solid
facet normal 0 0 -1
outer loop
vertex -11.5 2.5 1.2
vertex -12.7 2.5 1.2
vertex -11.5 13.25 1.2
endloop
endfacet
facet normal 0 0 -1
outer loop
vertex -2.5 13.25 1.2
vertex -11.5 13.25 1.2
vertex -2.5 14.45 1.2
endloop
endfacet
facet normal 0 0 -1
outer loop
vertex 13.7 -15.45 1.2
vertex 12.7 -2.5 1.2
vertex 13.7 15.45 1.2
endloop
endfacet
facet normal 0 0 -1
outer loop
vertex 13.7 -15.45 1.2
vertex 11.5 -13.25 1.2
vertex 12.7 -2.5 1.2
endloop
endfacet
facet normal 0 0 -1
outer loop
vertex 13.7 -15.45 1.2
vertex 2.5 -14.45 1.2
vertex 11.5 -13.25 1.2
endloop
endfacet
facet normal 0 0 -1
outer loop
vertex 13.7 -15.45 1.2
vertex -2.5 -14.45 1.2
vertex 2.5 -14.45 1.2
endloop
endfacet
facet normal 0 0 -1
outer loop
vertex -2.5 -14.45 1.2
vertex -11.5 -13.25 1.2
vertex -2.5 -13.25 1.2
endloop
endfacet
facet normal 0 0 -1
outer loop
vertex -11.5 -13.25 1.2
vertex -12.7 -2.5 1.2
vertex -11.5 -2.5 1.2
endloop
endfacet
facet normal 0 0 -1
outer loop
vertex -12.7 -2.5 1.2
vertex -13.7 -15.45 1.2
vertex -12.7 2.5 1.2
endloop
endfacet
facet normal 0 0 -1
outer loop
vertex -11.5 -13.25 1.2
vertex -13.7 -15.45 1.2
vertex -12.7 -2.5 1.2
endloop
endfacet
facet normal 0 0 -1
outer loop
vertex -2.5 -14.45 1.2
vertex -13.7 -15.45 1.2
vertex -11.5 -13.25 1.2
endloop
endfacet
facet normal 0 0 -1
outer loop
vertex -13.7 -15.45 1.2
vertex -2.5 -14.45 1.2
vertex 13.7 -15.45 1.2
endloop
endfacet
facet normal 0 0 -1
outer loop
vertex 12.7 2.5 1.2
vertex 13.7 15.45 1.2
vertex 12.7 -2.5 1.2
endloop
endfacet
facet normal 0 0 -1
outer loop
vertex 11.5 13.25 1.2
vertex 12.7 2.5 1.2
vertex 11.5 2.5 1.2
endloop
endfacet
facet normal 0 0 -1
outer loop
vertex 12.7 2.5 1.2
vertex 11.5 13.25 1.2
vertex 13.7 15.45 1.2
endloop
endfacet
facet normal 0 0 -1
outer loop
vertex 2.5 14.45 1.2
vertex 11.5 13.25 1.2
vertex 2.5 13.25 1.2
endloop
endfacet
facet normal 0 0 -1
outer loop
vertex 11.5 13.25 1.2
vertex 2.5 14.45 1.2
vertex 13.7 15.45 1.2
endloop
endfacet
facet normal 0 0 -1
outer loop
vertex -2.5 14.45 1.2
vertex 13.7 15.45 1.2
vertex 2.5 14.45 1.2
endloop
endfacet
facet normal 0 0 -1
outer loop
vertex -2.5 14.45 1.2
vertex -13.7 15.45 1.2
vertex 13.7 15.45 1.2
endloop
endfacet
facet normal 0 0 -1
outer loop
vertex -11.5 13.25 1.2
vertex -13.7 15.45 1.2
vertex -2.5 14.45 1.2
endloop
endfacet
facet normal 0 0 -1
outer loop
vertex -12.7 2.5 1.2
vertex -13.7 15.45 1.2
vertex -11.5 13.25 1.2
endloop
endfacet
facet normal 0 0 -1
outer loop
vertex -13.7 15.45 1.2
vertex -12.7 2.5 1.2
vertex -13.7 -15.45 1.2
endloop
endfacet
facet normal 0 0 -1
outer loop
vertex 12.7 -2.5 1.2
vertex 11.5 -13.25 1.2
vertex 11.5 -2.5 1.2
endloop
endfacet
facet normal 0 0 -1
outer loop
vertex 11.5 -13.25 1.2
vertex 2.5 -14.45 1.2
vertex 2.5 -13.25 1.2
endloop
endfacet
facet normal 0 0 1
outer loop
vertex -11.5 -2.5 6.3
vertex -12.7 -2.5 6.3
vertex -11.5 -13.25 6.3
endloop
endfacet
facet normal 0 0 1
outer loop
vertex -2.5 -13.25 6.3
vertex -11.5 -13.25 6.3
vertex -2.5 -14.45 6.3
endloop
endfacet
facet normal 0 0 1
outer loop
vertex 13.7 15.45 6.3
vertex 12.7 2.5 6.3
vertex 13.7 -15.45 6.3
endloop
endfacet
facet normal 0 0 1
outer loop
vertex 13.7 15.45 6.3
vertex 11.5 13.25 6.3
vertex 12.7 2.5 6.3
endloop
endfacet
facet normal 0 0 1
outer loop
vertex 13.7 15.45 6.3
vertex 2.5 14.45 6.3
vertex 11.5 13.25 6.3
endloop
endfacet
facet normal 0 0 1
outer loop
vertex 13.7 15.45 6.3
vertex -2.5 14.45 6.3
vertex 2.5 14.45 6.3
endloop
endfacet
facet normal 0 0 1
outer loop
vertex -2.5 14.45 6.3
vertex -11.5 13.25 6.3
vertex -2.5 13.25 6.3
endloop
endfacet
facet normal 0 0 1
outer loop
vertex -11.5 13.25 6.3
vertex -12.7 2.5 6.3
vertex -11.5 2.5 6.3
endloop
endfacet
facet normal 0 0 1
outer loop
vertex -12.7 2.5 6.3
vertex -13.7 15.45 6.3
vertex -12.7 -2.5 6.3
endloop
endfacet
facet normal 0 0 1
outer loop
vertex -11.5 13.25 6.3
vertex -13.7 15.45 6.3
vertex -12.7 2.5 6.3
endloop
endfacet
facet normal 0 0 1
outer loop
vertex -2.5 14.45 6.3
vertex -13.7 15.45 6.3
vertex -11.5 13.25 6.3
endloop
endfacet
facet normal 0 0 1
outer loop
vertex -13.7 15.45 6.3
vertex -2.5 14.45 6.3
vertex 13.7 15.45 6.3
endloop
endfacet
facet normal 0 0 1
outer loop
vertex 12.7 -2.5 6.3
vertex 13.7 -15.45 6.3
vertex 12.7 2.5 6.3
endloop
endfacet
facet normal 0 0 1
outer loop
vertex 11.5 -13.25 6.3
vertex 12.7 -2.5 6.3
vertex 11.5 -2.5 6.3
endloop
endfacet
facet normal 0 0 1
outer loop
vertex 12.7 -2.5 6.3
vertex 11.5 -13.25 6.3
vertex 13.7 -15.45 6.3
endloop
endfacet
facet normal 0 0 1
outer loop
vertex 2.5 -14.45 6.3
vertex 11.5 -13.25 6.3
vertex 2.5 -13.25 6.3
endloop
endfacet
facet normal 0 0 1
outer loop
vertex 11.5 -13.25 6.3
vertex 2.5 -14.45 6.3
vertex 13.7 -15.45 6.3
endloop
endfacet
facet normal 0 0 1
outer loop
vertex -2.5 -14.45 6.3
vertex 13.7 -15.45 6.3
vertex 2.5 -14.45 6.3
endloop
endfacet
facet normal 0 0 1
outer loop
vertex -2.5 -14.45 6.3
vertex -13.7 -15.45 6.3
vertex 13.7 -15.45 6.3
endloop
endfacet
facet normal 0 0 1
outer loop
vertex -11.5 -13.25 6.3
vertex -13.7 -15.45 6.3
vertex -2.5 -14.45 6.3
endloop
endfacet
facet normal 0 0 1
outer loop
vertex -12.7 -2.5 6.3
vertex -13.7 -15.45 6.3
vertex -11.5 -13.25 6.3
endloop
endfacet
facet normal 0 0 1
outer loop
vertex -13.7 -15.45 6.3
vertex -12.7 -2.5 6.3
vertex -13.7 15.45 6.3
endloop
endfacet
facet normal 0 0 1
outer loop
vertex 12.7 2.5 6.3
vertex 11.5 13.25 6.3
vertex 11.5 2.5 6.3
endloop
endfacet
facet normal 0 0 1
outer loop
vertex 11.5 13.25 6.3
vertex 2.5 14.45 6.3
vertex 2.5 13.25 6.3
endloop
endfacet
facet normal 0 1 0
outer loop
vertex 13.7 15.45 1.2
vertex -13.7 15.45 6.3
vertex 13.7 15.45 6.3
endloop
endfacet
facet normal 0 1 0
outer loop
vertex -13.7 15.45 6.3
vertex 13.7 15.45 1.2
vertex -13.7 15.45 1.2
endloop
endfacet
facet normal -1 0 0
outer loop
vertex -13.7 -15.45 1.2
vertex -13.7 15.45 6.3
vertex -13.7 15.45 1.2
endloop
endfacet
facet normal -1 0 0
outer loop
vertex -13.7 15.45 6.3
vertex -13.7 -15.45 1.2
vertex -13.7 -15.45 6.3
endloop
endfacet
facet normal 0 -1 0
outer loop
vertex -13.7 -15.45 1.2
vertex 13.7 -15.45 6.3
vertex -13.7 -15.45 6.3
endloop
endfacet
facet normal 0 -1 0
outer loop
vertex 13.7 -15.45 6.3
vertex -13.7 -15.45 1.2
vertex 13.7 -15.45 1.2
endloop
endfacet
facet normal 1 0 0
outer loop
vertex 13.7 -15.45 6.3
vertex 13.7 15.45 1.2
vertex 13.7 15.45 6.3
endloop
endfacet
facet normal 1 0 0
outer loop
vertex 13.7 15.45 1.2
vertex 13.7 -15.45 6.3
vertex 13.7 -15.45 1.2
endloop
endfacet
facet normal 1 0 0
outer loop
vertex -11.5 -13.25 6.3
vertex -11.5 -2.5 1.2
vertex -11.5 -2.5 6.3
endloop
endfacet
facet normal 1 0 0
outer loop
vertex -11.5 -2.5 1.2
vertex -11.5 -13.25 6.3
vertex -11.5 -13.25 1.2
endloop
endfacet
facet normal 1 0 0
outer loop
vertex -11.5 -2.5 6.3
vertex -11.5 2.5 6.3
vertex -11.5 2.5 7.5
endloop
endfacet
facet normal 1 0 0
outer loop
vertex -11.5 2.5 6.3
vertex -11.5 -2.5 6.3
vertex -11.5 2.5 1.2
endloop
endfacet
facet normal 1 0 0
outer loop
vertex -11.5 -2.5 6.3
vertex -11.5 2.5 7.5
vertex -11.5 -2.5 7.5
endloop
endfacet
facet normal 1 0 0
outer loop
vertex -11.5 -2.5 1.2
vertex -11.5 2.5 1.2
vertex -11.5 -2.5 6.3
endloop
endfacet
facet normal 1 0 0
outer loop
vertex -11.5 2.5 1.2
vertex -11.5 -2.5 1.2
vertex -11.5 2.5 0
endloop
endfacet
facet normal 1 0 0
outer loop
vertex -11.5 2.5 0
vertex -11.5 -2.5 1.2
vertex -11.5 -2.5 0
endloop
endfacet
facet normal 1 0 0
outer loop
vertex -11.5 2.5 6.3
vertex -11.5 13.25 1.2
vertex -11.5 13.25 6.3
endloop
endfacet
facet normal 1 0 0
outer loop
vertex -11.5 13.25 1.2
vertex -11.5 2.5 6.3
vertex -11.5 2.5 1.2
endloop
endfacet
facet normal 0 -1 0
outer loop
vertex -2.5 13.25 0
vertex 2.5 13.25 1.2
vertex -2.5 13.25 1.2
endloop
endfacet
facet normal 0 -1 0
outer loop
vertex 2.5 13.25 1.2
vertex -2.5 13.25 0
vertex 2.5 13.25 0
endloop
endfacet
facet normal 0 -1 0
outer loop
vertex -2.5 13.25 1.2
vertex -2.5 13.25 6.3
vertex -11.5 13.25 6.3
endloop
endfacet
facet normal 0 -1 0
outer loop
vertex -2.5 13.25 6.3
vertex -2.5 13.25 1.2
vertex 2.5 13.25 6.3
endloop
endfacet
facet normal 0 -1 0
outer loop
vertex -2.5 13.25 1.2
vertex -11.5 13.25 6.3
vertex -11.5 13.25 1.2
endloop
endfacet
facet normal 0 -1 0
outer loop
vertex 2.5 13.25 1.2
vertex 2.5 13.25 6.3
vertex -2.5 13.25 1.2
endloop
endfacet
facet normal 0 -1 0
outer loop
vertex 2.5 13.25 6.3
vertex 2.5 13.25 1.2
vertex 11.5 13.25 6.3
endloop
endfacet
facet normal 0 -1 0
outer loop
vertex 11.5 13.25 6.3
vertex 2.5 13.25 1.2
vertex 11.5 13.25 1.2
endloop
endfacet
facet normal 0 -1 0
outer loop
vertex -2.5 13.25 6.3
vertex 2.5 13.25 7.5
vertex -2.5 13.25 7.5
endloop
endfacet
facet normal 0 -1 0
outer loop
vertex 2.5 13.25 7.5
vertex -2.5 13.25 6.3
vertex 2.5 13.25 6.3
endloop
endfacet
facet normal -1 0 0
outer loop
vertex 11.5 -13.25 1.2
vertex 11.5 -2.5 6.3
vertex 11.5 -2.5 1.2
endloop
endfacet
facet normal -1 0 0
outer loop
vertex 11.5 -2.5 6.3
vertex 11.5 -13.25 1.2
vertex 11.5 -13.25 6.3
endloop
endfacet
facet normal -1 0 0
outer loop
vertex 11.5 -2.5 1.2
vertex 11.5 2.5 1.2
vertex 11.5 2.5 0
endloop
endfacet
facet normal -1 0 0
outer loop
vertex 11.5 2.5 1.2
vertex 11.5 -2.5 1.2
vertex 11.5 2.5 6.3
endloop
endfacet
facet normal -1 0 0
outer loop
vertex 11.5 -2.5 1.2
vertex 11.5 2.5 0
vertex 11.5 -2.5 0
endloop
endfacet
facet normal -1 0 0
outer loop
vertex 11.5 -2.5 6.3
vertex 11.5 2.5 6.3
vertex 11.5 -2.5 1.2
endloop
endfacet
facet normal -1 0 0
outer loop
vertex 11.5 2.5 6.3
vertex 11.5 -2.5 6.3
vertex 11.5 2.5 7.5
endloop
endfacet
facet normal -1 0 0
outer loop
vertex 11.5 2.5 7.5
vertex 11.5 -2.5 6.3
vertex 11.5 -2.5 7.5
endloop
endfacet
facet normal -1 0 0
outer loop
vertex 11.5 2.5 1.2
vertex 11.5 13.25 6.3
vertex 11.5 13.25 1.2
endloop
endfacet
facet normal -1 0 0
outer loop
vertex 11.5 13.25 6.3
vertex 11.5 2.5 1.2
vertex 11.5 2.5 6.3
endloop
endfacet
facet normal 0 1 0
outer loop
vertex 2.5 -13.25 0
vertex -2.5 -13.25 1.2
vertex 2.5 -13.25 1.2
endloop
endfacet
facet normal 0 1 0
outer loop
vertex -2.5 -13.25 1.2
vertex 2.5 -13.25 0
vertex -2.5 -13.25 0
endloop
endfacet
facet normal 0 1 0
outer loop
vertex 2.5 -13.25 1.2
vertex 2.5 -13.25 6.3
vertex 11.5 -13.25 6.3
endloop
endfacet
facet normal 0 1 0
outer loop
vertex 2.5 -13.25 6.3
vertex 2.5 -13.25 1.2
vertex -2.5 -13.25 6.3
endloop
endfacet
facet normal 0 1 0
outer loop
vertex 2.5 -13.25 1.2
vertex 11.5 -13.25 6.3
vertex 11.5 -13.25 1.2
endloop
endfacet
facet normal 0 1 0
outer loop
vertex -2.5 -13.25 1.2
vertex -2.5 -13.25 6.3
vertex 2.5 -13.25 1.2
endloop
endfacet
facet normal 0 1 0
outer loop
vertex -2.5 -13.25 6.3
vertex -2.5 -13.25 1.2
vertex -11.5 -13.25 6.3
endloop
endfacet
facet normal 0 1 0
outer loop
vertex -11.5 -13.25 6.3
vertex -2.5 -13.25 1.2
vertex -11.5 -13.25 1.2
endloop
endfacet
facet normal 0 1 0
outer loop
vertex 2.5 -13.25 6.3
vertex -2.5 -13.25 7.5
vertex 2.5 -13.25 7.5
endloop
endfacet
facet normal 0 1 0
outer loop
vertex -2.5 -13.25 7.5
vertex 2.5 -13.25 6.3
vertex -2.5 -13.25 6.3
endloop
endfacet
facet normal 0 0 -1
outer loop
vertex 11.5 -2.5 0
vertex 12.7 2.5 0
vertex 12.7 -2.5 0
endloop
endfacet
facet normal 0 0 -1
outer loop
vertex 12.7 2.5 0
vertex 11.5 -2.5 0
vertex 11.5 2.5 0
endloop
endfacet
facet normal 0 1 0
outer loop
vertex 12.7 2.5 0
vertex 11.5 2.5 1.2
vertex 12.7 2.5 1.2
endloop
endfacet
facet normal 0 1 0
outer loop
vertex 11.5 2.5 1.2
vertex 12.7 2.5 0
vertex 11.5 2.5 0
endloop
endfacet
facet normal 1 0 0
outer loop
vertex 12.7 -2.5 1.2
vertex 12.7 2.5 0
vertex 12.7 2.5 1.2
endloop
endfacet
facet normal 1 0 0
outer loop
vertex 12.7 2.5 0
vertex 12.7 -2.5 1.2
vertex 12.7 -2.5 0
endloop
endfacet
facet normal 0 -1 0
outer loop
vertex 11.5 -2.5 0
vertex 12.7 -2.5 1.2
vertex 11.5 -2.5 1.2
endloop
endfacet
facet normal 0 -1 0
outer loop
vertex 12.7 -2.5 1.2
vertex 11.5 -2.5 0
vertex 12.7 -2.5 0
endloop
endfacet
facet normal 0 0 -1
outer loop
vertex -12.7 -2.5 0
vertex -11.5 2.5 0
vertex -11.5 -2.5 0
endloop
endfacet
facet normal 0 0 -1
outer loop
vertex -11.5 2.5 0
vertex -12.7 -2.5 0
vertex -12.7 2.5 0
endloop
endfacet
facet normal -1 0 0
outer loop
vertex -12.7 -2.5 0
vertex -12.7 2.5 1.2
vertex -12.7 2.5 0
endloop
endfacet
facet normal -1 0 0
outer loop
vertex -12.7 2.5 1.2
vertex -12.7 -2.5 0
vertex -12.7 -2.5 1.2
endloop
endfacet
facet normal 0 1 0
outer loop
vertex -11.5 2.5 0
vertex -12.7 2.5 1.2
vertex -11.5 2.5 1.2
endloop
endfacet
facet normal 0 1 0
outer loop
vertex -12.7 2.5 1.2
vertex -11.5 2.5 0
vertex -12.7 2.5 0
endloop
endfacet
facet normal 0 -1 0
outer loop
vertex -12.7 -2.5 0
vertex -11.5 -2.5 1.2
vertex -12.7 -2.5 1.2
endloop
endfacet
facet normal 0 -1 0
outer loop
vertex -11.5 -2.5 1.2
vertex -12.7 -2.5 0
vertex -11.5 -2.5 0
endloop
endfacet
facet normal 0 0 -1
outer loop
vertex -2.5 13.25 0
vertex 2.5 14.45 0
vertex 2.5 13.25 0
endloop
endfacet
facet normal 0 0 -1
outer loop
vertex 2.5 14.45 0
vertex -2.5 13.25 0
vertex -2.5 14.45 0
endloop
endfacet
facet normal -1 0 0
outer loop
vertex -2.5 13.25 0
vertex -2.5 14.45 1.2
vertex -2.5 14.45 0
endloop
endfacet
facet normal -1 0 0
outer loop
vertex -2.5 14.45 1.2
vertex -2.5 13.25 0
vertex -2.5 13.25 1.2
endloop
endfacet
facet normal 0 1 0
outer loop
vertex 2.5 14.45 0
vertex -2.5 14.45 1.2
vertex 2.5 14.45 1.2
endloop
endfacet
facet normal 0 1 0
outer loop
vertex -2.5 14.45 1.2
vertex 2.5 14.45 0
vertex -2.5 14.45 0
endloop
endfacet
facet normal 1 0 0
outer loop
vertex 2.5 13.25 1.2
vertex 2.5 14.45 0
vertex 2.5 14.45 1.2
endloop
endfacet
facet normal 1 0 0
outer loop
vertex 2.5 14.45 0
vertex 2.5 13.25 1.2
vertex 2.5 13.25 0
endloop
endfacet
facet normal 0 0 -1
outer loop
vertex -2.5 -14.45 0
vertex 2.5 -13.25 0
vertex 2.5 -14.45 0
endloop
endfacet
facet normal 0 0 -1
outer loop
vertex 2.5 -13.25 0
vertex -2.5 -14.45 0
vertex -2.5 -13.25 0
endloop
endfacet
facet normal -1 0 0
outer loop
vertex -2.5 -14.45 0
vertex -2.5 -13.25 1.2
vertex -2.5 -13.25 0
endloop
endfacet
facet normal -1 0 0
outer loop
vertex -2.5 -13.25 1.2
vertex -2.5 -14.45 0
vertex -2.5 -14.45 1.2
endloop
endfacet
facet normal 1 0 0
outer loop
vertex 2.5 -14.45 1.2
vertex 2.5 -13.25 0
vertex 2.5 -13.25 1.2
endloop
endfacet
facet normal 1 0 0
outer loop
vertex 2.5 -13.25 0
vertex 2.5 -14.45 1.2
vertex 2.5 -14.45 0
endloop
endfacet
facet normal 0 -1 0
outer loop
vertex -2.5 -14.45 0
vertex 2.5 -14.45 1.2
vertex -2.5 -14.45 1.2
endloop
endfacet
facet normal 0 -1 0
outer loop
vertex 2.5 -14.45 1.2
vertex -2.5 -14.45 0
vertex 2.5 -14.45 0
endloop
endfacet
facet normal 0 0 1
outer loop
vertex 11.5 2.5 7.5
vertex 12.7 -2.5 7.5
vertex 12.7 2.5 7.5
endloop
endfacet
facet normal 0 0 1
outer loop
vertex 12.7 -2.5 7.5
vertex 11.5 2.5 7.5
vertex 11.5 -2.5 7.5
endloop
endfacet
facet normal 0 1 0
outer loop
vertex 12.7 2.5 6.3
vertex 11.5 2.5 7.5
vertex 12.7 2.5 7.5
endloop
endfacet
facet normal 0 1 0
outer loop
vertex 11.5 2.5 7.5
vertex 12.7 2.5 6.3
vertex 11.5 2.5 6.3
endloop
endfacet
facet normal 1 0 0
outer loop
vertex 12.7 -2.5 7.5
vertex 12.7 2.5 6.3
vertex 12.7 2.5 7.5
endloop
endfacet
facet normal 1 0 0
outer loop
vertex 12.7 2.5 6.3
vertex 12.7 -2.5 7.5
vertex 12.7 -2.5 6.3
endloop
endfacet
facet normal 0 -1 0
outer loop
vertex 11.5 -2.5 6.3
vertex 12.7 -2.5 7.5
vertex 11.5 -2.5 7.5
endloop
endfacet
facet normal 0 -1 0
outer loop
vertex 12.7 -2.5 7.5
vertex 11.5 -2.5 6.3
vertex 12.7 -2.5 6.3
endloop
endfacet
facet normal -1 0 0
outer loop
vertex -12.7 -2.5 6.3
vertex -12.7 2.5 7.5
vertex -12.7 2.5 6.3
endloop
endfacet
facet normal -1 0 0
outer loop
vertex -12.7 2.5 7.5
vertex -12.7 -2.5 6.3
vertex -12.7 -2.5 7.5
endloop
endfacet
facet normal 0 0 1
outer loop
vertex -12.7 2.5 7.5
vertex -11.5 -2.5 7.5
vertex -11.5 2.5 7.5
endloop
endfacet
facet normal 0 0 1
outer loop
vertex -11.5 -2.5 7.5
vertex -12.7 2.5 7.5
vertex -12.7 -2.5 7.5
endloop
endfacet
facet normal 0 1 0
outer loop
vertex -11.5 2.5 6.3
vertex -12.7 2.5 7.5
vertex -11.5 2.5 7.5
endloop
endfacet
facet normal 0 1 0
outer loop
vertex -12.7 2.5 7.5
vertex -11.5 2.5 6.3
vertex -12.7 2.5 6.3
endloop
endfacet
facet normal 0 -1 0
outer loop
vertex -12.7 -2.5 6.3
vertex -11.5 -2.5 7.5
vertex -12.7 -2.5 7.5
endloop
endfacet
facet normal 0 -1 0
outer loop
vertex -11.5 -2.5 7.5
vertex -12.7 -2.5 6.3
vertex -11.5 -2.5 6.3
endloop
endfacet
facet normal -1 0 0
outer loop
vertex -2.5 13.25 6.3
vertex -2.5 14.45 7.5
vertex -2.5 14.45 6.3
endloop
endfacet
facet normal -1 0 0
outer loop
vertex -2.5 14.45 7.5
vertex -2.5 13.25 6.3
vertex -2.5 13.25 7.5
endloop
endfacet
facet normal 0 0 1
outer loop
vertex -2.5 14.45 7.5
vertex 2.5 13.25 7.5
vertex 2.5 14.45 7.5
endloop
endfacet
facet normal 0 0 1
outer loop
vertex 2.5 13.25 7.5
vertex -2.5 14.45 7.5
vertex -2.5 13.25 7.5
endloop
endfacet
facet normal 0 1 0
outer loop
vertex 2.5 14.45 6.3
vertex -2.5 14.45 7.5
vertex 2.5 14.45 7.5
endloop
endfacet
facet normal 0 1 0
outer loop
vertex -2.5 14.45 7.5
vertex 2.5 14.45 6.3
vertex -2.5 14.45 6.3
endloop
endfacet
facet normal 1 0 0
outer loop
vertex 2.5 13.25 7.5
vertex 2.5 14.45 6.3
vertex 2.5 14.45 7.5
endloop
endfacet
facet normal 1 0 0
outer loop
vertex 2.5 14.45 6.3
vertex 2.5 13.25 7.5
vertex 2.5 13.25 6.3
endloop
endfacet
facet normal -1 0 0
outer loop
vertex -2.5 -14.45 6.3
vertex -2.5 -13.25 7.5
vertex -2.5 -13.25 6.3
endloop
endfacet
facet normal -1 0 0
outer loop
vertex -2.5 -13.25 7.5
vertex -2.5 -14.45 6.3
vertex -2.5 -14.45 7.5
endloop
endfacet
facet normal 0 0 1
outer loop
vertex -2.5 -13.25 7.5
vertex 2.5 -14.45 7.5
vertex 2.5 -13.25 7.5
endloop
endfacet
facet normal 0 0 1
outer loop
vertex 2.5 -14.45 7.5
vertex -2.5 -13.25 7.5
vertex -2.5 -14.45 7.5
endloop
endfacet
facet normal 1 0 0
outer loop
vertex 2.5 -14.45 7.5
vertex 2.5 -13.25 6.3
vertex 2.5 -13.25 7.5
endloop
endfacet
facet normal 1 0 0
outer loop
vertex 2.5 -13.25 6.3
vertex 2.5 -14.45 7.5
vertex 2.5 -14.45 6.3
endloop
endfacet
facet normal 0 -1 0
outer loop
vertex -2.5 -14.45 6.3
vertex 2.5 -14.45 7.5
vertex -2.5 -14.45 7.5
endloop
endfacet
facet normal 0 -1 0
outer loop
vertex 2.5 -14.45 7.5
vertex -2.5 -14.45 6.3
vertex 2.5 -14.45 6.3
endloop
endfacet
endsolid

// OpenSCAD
 
 
$fn = 20;


// Wall thickness>1.2mm, thinnest part≥0.8mm
  

radii = 2;
 
innerx = 23;
innery = 26.5;  // freecad was 26. should be 26.5 or 27

outerx = 42;
outery = 48;




// need a pro-trusion to meet minimum specs - 0.2,0.2,10
%color("yellow")
 linear_extrude(10) {       
       // circ 
     translate([0, -(innery /2 + 5), 0 ] )
       circle( 3/2);         
}


 
wall = 1.2;
      
/*
    EXTR. tab must be set to wall thickness. 
        and cannot protrude past the box perimeter
    - otherwise the wound coil cannot be slid off.
*/

tabx = wall;
taby = 5;

fudge = 0.3;  // not div
tabxf = tabx + fudge;
tabyf = taby + fudge;

      

// horizontal flange
%color("yellow")
 linear_extrude( wall) { 
 
    difference() {  
        
        group() { 
        offset(r = radii)  
            square( [outerx - radii * 2, outery - radii * 2], center = true); 
    
            
        }
    
        group() {
            square( [innerx , innery  ], center = true);
            
           // right
           translate( [ innerx / 2  + tabx / 2 ,0, 0 ] )
            square( [tabxf, tabyf ] , center = true);
     
           // left
           translate( [ -innerx / 2  - tabx / 2 ,0, 0 ] )
            square( [tabxf, tabyf ] , center = true);
        
           // top
           translate( [  0,  +innery / 2  + tabx / 2 , 0 ] )
            square( [ tabyf, tabxf  ] , center = true); 
           
           // bottom
           translate( [  0,  -innery / 2  - tabx / 2 , 0 ] )
            square( [ tabyf, tabxf  ] , center = true); 
            
            
            /*
           // have to mirror text if put on bottom  
           // text engrave min. depth is 0.8mm. and 0.8mm  width.
           // so must be put on top, even if its the inside         
           translate( [0, (innery / 2) + 3.5, 0]) 
             //mirror([1,0,0])
               // text("main06.scad", 2.5, halign = "center"); 
            text("dsn06", 5, halign = "center");
     
             */
        }
    }
} 


 
//
// % transparent
// # easier to see
// box/ former

// just define once, instead of having extra band
// main07-b wall + 0;  main07-c wall + 1;
bodywall= wall + 1;

// eg. 16mm. and 2 bobbins, with end faces
// main07-d use 15mm.
height  = 15 / 2 - wall * 2;

/* 
 if use  half wall for tab depth, then the flange can have two bobbins at each end.
 but if tab - is <1.2mm it may not be manufacturable
 perhaps need to try making both
 wall / 2;  // only for positive shape
*/
tabz =  wall ; // / 2

translate([0,0, wall + 0 ] ) {    

 // eg. we (16 / 2) -0.4 - 0.4
 linear_extrude(  height) 
    difference() {  

        square( [innerx + (bodywall * 2), innery + (bodywall * 2)], center = true);
        square( [innerx , innery  ], center = true);
  }  
  
  
    // bottom tabs
  
    // right
    translate( [ innerx / 2  + tabx / 2 , 0, -tabz  ] )
    linear_extrude( tabz ) 
        square( [tabx, taby ] , center = true);
  
    // left
    translate( [ -innerx / 2  - tabx / 2 , 0, -tabz  ] )
    linear_extrude( tabz ) 
        square( [tabx, taby ] , center = true);
  
    // top
    translate( [ 0, innery / 2  + tabx / 2 , -tabz  ] )
    linear_extrude( tabz) 
        square( [ taby, tabx  ] , center = true);
  
    // bottom
    translate( [ 0, -innery / 2  - tabx / 2 , -tabz  ] )
    linear_extrude( tabz) 
        square( [taby, tabx  ] , center = true);
        
   // top tabs     
   
   
    // right
    translate( [ innerx / 2  + tabx / 2 , 0, height   ] )
    linear_extrude( tabz ) 
        square( [tabx, taby ] , center = true);
        
    // left
    translate( [ -innerx / 2  - tabx / 2 , 0, height  ] )
    linear_extrude( tabz ) 
        square( [tabx, taby ] , center = true);
  
    // top
    translate( [ 0, innery / 2  + tabx / 2 ,  height ] )
    linear_extrude( tabz ) 
        square( [ taby, tabx  ] , center = true);
  
    // bottom
    translate( [ 0, -innery / 2  - tabx / 2 , height  ] )
    linear_extrude( tabz) 
        square( [taby, tabx  ] , center = true);
        
  
  
}


 

 
